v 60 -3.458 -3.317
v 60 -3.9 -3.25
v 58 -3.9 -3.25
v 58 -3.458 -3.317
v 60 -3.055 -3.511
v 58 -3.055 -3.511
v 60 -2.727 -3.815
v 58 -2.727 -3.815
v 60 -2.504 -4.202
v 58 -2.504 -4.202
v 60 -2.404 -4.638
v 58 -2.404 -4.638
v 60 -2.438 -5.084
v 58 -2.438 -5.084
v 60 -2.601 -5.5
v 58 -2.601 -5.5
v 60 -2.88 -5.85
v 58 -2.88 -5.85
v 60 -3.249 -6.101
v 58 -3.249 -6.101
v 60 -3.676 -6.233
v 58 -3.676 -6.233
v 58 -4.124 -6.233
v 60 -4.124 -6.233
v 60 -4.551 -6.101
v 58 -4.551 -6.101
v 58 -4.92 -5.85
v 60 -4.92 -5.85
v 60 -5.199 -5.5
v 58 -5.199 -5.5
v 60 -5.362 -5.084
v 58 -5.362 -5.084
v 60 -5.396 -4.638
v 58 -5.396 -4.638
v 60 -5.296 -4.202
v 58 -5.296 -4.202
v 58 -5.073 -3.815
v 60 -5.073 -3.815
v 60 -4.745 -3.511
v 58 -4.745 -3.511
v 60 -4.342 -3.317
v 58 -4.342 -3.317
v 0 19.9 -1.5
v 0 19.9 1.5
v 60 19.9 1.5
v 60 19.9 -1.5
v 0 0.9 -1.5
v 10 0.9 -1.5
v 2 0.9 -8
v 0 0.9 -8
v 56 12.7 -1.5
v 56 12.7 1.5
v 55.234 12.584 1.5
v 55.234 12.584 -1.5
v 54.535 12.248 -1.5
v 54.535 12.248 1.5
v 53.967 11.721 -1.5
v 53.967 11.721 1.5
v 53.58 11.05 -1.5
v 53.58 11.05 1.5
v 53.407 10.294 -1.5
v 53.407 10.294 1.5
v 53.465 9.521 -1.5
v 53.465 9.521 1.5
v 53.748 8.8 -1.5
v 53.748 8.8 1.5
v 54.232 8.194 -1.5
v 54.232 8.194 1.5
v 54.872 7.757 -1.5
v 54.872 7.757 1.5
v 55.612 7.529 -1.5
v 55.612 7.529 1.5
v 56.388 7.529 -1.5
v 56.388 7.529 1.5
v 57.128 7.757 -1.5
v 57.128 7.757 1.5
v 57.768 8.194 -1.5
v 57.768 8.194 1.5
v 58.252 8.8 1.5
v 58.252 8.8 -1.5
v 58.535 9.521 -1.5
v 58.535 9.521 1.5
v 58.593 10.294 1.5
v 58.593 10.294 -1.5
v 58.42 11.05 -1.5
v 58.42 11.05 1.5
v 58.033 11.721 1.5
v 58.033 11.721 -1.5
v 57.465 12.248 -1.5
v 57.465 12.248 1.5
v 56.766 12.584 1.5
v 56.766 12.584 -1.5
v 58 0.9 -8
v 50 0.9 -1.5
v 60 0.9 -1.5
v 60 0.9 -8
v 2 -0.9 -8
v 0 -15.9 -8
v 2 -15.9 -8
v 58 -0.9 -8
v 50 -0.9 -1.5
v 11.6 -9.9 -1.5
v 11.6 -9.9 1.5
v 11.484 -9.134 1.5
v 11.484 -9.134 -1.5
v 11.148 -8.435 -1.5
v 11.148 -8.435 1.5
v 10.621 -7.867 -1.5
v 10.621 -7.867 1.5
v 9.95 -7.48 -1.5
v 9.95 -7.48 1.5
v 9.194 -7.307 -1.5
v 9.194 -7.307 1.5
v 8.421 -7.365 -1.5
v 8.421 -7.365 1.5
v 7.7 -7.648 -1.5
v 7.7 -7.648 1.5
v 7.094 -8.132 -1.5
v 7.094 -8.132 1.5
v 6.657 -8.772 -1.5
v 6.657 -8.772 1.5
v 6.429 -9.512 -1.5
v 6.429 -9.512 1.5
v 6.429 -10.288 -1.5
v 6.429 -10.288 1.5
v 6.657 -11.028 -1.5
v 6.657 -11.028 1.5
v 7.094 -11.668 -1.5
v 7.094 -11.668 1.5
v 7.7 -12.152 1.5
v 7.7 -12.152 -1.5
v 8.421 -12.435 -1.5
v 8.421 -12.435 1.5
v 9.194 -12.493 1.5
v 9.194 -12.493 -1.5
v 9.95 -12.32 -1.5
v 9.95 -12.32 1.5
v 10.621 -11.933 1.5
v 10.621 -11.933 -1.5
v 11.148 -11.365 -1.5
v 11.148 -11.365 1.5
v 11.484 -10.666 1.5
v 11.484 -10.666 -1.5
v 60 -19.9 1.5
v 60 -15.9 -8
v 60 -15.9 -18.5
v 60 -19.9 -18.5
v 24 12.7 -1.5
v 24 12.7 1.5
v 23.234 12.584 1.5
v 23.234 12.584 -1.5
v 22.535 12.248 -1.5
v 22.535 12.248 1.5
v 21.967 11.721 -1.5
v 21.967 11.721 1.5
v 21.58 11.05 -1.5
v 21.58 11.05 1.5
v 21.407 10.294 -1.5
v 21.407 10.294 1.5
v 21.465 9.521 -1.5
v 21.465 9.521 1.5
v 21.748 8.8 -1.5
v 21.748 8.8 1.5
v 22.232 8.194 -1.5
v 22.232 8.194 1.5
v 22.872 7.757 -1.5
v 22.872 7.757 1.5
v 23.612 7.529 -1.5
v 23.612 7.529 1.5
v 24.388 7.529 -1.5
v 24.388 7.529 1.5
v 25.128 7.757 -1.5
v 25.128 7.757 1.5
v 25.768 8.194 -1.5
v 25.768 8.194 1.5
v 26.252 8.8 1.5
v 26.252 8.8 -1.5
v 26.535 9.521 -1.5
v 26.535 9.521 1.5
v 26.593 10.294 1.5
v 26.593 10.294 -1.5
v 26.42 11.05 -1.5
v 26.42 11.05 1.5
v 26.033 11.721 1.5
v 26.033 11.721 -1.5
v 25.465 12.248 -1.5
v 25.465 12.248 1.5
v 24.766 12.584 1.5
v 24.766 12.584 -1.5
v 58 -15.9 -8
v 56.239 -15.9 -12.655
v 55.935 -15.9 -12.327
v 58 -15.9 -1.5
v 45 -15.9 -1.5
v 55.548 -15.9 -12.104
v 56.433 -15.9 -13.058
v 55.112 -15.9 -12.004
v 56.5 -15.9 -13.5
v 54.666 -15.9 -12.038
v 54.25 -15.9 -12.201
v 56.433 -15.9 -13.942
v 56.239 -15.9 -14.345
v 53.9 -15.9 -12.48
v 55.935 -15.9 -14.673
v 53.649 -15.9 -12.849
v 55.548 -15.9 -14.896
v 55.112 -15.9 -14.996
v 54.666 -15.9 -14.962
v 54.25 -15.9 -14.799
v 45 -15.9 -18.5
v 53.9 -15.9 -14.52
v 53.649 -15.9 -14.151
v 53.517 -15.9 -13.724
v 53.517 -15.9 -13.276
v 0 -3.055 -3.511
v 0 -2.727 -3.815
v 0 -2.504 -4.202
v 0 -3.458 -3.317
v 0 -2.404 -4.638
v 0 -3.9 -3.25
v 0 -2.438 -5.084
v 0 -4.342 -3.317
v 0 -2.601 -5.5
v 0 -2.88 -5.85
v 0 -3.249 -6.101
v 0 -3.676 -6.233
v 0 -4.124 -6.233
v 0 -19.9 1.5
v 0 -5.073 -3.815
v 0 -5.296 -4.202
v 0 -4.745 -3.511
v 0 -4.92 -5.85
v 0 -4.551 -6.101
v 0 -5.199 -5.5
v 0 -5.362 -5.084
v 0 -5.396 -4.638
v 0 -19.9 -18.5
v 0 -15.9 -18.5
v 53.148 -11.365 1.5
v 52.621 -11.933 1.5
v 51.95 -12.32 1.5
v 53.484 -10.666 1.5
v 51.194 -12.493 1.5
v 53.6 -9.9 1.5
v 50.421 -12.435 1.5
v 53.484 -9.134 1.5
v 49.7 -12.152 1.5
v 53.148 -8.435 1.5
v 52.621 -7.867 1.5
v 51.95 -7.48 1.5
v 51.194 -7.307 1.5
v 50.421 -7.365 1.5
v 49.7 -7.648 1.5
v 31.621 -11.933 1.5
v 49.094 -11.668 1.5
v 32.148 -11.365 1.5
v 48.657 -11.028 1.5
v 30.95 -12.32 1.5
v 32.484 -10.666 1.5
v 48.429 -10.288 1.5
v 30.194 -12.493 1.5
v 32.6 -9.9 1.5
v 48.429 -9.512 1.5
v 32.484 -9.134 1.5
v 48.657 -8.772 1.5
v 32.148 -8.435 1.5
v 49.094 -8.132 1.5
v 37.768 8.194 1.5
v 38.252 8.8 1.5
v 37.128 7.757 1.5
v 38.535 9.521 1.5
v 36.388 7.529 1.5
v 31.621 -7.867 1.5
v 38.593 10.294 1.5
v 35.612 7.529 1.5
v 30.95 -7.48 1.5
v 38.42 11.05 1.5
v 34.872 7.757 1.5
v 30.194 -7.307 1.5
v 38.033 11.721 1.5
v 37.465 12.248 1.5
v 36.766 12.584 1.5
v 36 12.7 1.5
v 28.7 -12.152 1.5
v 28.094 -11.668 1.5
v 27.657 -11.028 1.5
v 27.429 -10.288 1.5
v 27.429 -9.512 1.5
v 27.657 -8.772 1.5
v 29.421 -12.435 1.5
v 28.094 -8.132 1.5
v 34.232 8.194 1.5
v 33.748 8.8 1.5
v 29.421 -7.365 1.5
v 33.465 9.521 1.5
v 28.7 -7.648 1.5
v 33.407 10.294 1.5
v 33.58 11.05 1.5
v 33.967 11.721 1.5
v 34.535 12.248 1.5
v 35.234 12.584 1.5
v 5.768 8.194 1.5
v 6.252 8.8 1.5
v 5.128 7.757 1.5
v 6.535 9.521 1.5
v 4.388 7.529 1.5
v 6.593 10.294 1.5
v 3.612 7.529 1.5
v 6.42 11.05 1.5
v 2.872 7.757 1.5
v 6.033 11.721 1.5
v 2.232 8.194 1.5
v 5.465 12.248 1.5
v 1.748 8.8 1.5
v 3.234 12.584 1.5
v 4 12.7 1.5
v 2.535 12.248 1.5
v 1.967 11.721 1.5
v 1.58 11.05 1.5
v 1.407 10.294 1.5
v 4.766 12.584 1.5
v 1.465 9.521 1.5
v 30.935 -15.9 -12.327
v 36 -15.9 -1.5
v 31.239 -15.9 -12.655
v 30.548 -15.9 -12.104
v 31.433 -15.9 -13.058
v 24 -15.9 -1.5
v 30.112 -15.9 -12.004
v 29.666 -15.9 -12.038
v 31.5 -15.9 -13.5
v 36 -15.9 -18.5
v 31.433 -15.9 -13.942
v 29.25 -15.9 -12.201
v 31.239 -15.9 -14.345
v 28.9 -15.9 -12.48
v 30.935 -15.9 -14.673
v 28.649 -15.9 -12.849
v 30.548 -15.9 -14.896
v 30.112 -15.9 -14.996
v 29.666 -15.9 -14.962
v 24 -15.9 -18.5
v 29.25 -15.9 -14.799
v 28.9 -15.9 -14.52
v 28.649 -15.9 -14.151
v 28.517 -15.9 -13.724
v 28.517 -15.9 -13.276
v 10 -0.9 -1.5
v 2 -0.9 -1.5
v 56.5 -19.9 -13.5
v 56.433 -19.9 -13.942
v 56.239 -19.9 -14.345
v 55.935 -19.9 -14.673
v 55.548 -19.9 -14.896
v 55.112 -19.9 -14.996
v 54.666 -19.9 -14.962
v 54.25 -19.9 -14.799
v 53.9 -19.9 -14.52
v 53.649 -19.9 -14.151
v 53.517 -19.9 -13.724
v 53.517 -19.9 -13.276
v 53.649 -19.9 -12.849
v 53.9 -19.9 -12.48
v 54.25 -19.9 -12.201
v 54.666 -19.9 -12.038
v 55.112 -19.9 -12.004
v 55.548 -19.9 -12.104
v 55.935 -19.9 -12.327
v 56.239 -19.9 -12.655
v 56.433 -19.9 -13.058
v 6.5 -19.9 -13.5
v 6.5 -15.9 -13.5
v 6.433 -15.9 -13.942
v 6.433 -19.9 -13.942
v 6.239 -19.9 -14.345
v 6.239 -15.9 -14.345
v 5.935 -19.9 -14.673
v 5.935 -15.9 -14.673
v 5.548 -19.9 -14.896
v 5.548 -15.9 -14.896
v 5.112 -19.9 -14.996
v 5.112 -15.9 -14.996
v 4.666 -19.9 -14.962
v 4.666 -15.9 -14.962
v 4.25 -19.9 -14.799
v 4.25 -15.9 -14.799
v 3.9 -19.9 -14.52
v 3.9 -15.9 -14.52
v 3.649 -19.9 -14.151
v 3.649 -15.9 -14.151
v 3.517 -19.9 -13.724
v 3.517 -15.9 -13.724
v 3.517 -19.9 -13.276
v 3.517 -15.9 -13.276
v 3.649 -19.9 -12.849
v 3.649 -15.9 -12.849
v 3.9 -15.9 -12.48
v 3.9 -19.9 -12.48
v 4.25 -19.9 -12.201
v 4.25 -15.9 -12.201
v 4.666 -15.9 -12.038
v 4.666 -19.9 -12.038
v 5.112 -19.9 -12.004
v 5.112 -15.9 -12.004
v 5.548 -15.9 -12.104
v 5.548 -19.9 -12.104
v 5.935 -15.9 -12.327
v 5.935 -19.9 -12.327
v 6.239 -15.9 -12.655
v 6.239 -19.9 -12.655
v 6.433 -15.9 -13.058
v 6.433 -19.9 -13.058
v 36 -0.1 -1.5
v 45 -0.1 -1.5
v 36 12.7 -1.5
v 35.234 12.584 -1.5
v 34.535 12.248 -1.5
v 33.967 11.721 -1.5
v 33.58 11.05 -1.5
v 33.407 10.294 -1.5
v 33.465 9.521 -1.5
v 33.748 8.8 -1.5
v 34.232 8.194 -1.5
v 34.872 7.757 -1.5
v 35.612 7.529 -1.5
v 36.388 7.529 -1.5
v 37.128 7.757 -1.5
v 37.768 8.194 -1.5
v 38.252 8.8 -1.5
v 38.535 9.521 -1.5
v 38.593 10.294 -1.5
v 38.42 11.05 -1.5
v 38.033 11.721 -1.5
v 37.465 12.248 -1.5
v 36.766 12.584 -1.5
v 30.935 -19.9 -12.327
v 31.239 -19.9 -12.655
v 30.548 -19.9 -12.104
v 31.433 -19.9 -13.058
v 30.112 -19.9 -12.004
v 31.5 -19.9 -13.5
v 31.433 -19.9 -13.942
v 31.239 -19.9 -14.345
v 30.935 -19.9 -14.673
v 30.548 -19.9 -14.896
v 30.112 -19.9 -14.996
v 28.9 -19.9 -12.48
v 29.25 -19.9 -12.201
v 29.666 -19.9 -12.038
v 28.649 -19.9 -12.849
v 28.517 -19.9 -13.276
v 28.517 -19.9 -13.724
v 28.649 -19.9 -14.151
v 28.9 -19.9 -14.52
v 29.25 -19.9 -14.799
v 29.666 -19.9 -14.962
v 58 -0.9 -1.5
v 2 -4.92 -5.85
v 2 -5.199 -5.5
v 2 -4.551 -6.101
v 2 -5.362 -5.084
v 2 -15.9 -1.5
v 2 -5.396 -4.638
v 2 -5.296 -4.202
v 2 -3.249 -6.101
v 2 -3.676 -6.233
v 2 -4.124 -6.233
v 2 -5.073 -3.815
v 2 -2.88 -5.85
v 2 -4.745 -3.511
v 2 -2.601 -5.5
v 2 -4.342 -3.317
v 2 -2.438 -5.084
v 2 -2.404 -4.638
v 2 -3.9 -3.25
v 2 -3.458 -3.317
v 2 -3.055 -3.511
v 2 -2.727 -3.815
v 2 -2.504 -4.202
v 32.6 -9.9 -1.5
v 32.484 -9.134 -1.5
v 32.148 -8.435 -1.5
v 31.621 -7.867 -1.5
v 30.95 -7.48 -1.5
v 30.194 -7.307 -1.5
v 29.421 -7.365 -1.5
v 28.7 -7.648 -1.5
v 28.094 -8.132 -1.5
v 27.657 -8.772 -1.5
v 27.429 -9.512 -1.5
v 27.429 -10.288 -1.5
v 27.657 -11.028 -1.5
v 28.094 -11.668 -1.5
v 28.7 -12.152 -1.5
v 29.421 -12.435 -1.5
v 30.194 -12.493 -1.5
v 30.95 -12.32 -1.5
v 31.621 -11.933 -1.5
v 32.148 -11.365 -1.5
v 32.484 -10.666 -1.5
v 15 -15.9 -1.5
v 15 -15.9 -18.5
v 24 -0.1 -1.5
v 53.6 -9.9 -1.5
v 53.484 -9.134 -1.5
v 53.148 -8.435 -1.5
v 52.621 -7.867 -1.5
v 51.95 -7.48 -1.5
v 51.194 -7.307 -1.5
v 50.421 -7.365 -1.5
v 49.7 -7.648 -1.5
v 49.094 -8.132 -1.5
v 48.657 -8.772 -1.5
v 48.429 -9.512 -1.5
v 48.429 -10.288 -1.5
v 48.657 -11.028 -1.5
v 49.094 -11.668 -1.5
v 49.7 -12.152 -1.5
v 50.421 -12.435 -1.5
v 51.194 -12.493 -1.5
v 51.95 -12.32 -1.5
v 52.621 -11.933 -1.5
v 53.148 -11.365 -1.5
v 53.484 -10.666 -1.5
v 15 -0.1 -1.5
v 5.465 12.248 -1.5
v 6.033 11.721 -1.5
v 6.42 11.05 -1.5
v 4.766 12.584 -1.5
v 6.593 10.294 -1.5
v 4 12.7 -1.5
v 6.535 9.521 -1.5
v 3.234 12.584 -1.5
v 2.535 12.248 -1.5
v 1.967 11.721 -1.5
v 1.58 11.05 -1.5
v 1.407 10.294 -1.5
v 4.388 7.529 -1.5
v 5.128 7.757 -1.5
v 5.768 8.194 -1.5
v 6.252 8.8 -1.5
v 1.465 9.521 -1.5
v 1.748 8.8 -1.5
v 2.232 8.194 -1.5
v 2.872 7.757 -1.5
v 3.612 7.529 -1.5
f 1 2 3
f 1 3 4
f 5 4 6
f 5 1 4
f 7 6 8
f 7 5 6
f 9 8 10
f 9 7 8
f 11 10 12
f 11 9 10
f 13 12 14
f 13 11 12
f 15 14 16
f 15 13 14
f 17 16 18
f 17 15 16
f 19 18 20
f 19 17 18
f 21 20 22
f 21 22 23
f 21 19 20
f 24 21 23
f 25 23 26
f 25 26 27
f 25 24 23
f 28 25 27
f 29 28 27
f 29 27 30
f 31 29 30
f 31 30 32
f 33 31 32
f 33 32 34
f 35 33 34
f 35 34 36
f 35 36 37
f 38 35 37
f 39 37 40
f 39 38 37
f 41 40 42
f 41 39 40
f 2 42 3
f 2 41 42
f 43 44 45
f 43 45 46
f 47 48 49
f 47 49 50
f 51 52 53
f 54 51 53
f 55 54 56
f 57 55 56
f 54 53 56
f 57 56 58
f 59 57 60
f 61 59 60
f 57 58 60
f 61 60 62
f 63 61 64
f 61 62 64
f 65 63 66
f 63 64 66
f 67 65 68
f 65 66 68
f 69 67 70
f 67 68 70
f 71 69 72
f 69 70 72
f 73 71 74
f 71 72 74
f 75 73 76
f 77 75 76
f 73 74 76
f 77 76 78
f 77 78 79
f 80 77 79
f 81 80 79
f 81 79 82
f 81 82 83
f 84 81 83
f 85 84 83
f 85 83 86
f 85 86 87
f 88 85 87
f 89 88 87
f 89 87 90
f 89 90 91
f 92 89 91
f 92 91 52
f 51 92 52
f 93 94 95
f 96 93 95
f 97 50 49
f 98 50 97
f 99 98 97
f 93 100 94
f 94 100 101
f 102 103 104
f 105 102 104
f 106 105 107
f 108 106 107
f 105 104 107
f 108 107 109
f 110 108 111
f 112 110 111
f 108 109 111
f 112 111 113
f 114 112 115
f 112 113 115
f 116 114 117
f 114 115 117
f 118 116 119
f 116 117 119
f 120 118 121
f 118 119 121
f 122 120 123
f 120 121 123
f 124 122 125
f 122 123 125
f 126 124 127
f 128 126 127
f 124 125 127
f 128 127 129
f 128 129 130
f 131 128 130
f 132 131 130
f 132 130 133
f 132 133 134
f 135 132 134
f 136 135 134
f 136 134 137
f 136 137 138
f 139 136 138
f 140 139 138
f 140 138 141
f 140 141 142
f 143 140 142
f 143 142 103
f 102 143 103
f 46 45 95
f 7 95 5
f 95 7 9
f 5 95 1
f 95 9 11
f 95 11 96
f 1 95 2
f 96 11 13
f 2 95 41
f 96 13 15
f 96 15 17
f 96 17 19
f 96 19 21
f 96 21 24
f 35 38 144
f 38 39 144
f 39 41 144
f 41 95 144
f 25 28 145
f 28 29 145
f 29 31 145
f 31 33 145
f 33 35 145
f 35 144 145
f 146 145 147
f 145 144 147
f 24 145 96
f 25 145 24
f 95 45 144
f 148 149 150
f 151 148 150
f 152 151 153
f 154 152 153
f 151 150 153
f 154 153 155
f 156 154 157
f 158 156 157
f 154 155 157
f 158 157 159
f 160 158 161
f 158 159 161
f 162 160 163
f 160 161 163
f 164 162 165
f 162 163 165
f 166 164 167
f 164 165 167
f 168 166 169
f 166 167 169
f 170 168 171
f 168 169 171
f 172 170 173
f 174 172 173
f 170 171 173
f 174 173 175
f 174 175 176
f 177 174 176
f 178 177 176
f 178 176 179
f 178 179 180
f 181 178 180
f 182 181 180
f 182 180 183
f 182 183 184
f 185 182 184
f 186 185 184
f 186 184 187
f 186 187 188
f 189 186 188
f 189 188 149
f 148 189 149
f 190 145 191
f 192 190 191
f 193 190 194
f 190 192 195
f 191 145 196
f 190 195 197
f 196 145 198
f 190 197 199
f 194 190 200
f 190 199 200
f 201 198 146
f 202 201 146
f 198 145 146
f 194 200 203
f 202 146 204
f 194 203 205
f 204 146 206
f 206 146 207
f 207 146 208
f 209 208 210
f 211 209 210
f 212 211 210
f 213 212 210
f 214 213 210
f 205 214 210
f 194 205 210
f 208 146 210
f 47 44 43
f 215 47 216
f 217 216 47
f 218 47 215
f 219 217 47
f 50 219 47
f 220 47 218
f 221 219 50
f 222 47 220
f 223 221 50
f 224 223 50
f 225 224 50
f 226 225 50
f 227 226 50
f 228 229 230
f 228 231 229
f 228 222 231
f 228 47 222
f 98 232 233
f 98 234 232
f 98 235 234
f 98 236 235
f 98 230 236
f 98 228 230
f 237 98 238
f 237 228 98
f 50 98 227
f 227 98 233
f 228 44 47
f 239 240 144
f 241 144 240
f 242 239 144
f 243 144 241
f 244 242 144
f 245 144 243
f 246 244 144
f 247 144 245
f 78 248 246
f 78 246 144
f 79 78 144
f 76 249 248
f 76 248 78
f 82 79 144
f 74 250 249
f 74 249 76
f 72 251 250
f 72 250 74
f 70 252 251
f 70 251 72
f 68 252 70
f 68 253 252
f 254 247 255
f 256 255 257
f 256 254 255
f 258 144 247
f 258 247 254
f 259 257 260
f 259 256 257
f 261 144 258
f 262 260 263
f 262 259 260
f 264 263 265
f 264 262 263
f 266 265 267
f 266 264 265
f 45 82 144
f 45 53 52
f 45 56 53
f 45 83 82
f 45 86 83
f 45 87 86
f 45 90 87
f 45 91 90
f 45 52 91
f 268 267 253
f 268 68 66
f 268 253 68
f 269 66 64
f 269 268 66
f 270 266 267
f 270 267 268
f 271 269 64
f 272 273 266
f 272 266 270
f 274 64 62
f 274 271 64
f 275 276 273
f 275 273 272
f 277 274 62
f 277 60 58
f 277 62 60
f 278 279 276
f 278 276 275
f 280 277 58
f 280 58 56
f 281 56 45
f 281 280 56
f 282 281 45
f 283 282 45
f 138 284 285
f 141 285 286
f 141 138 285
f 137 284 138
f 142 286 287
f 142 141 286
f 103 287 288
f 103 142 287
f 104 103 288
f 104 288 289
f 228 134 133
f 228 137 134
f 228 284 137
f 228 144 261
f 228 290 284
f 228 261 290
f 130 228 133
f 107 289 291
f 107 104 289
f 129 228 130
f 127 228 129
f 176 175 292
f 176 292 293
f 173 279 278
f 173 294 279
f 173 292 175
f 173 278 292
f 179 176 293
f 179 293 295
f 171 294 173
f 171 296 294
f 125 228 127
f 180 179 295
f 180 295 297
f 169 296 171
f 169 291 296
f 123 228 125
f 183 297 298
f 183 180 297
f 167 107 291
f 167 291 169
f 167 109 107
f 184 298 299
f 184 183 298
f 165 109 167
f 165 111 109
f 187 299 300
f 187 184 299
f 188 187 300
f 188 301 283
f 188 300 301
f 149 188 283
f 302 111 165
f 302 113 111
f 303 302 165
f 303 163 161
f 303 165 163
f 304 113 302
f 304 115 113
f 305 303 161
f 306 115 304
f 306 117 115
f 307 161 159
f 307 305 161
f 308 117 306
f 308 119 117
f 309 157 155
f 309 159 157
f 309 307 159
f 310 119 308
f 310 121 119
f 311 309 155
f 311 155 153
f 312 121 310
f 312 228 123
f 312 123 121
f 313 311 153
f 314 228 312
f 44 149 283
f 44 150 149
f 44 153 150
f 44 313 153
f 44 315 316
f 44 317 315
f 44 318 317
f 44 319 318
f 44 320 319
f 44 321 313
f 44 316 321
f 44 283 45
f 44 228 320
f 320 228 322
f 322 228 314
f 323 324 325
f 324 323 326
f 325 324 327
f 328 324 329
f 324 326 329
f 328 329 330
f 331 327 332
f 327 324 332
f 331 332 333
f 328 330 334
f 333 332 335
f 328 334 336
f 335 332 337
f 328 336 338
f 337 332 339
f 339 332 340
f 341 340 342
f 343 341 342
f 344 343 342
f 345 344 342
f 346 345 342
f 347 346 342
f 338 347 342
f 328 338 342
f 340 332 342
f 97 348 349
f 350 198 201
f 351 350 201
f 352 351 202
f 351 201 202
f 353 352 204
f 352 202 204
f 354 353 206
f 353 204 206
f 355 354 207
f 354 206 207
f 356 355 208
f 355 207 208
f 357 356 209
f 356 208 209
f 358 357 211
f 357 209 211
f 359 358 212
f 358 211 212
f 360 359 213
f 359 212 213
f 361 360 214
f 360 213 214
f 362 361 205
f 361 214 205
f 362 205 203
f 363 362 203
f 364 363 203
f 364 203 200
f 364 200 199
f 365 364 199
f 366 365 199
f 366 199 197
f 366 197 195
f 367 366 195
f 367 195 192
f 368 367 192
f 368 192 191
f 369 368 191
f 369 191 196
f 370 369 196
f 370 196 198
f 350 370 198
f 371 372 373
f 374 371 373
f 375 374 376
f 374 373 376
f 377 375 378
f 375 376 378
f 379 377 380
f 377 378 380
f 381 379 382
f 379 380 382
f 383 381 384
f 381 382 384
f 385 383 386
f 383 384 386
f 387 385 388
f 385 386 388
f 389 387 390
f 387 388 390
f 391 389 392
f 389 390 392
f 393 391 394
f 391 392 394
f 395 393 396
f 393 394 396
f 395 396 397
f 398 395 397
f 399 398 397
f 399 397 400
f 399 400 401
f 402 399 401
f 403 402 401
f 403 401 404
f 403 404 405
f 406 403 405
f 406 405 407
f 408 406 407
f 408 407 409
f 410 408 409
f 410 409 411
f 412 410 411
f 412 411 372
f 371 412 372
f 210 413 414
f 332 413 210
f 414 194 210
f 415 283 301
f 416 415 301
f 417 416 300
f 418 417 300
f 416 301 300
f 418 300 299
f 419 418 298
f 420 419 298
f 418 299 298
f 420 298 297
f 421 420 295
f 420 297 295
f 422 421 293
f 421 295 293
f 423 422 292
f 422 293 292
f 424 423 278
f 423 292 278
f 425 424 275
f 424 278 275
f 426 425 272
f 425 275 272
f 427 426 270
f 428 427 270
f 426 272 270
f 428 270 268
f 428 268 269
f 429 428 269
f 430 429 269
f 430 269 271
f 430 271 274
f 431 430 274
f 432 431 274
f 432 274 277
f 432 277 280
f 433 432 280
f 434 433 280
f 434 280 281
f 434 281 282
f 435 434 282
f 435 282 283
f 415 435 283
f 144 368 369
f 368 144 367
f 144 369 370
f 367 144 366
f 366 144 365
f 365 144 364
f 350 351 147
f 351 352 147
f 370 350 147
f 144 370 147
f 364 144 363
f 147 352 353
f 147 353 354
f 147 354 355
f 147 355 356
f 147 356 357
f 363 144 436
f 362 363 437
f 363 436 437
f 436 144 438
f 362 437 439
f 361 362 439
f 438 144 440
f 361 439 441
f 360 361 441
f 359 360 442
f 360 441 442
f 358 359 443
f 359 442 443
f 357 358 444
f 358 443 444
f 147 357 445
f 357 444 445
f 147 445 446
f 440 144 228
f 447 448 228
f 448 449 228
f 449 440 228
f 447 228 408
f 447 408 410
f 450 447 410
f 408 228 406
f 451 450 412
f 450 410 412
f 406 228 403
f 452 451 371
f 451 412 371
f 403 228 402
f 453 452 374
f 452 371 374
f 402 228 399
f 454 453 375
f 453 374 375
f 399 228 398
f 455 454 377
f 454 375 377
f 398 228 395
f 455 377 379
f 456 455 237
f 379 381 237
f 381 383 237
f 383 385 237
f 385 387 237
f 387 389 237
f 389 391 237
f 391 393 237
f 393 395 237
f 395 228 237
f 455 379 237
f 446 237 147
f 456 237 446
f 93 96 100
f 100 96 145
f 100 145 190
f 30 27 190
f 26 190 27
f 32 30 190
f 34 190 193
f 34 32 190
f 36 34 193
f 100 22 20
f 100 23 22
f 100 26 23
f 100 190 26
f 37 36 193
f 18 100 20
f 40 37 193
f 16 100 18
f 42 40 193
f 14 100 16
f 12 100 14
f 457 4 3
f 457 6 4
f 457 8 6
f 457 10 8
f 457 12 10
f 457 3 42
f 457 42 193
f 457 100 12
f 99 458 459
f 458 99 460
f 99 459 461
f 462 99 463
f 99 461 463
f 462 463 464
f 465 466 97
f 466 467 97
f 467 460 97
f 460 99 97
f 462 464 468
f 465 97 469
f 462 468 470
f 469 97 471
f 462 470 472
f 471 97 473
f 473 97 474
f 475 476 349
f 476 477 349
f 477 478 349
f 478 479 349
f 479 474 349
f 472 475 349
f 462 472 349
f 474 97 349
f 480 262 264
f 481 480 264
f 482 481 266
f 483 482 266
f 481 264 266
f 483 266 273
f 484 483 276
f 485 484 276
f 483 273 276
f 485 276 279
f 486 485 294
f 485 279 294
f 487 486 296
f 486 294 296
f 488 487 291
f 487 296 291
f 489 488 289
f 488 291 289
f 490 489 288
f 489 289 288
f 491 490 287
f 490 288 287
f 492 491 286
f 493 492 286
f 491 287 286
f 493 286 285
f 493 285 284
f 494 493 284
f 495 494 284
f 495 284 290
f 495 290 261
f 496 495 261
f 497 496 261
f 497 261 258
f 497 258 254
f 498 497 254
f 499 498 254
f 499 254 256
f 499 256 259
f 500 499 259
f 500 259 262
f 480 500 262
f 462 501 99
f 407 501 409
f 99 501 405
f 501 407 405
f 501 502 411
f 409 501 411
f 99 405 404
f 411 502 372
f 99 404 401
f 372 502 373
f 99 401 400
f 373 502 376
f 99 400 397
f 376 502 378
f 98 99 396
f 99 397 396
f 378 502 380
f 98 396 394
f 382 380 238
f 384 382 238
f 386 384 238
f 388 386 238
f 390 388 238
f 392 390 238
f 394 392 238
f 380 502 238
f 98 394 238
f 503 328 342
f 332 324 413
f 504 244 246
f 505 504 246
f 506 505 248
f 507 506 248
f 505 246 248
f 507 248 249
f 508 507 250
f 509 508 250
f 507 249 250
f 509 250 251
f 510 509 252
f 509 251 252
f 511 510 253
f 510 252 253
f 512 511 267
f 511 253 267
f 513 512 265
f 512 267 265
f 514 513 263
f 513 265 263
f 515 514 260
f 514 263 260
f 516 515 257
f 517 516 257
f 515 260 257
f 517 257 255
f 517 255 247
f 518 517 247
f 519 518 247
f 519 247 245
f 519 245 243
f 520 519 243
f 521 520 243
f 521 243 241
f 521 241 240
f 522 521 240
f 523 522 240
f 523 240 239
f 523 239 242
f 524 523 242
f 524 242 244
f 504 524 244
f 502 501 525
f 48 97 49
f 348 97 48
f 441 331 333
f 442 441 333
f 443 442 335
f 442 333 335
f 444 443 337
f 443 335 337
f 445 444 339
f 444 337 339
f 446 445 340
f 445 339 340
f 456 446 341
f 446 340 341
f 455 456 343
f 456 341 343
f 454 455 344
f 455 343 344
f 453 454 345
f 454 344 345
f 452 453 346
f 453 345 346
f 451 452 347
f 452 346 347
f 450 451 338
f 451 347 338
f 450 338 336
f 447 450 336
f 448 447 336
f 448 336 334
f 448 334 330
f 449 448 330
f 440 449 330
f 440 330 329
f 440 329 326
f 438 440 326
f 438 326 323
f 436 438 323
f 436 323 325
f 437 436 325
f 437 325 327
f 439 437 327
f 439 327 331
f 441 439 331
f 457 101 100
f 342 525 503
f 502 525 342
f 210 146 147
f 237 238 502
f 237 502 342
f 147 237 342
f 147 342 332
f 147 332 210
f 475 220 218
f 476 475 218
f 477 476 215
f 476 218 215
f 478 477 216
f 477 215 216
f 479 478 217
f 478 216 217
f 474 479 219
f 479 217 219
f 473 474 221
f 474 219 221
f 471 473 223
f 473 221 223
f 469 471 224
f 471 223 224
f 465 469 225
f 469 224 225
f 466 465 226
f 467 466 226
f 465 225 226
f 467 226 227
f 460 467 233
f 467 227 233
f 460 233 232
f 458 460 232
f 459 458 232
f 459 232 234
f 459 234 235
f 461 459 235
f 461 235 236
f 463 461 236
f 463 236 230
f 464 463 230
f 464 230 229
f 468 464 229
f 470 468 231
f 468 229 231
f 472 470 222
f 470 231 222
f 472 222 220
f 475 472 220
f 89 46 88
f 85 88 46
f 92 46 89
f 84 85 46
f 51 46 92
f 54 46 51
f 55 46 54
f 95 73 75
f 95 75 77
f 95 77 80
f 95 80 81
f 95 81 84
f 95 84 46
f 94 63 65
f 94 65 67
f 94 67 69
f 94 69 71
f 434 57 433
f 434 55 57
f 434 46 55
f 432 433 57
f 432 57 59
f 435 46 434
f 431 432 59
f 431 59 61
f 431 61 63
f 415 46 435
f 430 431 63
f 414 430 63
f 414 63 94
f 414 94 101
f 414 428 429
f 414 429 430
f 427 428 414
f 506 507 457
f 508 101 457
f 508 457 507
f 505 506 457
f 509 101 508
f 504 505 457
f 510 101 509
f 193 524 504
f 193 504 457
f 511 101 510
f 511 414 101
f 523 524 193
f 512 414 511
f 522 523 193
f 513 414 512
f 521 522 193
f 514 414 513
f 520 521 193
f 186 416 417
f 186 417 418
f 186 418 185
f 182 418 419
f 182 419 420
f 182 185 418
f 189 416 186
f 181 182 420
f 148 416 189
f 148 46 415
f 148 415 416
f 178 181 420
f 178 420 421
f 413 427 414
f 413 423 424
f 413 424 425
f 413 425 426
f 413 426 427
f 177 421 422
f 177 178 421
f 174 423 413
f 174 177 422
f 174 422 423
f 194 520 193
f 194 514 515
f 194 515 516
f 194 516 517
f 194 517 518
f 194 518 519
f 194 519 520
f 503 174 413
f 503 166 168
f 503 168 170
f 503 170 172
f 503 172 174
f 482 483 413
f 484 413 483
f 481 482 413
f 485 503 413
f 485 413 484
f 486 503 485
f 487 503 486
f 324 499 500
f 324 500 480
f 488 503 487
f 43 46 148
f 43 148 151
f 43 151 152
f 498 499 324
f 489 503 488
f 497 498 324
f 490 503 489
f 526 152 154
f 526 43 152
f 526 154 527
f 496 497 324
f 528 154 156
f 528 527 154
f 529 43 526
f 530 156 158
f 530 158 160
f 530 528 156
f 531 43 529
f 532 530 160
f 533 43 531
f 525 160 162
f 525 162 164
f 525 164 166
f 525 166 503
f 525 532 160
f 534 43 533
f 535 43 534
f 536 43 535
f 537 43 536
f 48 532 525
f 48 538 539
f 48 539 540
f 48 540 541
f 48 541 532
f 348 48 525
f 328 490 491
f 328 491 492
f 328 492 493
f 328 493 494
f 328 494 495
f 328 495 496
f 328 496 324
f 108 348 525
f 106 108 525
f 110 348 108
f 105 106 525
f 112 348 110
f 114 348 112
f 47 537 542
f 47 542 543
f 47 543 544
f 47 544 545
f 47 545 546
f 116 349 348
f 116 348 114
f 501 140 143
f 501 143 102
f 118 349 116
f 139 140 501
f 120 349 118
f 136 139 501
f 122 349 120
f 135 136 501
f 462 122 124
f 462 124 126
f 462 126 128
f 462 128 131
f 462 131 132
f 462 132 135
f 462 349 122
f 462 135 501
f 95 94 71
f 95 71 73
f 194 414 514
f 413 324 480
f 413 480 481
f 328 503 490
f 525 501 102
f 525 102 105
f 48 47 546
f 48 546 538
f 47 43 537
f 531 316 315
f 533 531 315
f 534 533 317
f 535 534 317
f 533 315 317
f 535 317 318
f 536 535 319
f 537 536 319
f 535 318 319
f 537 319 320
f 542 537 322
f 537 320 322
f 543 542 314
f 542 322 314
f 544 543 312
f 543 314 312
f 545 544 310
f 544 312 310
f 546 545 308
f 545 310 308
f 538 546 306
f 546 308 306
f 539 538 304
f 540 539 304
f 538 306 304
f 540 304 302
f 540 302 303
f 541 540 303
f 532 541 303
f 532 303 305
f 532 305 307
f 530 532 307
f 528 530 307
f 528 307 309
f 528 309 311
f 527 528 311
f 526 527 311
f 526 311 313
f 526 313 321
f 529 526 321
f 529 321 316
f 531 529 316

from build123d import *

# Parameters (mm, degrees)
EXTRUDE_1_DEPTH     = 60
SKETCH_2_W          = 15
SKETCH_2_H          = 17
SKETCH_2_W_2        = 12
CUT_EXTRUDE_1_DEPTH = 60
HOLE_WIZARD_1_D     = 5.2
HOLE_WIZARD_2_D     = 3
SKETCH_7_R          = 1.5
EXTRUDE_2_DEPTH     = 2
EXTRUDE_3_DEPTH     = 1.8
HOLE_WIZARD_3_D     = 5.2


with BuildPart() as part:
    # 草图1 → 凸台-拉伸1 (new body)
    with BuildSketch(Plane(origin=(0, 0, 0), x_dir=(0, 0, -1), z_dir=(1, 0, 0))):
        Polygon((-1.5, 19.9), (1.5, 19.9), (1.5, -0.1), (18.5, -15.9), (18.5, -19.9), (1.5, -19.9), (-1.5, -19.9), align=None)
    extrude(amount=EXTRUDE_1_DEPTH)

    # 草图2 → 切除-拉伸1 (cut)
    with BuildSketch(Plane(origin=(0, -15.9, 0), x_dir=(-1, 0, 0), z_dir=(0, -1, 0))):
        with Locations((-52.5, 10)):
            Rectangle(SKETCH_2_W, SKETCH_2_H)
        with Locations((-7.5, 10)):
            Rectangle(SKETCH_2_W, SKETCH_2_H)
        with Locations((-30, 10)):
            Rectangle(SKETCH_2_W_2, SKETCH_2_H)
    extrude(amount=-CUT_EXTRUDE_1_DEPTH, mode=Mode.SUBTRACT)

    # 孔1 (through all)
    with Locations(Plane(origin=(0, 0, -1.5), x_dir=(-1, 0, 0), z_dir=(0, 0, -1))):
        with Locations((-51, -9.9), (-30, -9.9), (-9, -9.9)):
            Hole(HOLE_WIZARD_1_D / 2)

    # 孔2 (through all)
    with Locations(Plane(origin=(0, -19.9, 0), x_dir=(-1, 0, 0), z_dir=(0, -1, 0))):
        with Locations((-55, 13.5), (-30, 13.5), (-5, 13.5)):
            Hole(HOLE_WIZARD_2_D / 2)

    # 草图7 → 凸台-拉伸2 (add)
    with BuildSketch(Plane.ZY):
        Polygon((-1.5, -0.9), (-8, -0.9), (-8, -6.9), (-8, -15.9), (-1.5, -15.9), (-1.5, -6.9), align=None)
        with Locations((-4.75, -3.9)):
            Circle(SKETCH_7_R, mode=Mode.SUBTRACT)
    extrude_2 = extrude(amount=-EXTRUDE_2_DEPTH)

    # 草图8 → 凸台-拉伸3 (add)
    with BuildSketch(Plane(origin=(0, -0.9, 0), x_dir=(1, 0, 0), z_dir=(0, 1, 0))):
        Polygon((2, 8), (10, 1.5), (2, 1.5), (0, 1.5), (0, 8), align=None)
    extrude_3 = extrude(amount=EXTRUDE_3_DEPTH)

    # 孔3 (through all)
    with Locations(Plane(origin=(56, 10.1, -1.5), x_dir=(0, -1, 0), z_dir=(0, 0, -1))):
        with Locations((0, 0), (0, 20), (0, 32), (0, 52)):
            Hole(HOLE_WIZARD_3_D / 2)

    # 镜向1: 凸台-拉伸2, 凸台-拉伸3 across plane
    add(extrude_2.mirror(Plane.ZY.offset(-30)))
    add(extrude_3.mirror(Plane.ZY.offset(-30)))


solid = part.part
